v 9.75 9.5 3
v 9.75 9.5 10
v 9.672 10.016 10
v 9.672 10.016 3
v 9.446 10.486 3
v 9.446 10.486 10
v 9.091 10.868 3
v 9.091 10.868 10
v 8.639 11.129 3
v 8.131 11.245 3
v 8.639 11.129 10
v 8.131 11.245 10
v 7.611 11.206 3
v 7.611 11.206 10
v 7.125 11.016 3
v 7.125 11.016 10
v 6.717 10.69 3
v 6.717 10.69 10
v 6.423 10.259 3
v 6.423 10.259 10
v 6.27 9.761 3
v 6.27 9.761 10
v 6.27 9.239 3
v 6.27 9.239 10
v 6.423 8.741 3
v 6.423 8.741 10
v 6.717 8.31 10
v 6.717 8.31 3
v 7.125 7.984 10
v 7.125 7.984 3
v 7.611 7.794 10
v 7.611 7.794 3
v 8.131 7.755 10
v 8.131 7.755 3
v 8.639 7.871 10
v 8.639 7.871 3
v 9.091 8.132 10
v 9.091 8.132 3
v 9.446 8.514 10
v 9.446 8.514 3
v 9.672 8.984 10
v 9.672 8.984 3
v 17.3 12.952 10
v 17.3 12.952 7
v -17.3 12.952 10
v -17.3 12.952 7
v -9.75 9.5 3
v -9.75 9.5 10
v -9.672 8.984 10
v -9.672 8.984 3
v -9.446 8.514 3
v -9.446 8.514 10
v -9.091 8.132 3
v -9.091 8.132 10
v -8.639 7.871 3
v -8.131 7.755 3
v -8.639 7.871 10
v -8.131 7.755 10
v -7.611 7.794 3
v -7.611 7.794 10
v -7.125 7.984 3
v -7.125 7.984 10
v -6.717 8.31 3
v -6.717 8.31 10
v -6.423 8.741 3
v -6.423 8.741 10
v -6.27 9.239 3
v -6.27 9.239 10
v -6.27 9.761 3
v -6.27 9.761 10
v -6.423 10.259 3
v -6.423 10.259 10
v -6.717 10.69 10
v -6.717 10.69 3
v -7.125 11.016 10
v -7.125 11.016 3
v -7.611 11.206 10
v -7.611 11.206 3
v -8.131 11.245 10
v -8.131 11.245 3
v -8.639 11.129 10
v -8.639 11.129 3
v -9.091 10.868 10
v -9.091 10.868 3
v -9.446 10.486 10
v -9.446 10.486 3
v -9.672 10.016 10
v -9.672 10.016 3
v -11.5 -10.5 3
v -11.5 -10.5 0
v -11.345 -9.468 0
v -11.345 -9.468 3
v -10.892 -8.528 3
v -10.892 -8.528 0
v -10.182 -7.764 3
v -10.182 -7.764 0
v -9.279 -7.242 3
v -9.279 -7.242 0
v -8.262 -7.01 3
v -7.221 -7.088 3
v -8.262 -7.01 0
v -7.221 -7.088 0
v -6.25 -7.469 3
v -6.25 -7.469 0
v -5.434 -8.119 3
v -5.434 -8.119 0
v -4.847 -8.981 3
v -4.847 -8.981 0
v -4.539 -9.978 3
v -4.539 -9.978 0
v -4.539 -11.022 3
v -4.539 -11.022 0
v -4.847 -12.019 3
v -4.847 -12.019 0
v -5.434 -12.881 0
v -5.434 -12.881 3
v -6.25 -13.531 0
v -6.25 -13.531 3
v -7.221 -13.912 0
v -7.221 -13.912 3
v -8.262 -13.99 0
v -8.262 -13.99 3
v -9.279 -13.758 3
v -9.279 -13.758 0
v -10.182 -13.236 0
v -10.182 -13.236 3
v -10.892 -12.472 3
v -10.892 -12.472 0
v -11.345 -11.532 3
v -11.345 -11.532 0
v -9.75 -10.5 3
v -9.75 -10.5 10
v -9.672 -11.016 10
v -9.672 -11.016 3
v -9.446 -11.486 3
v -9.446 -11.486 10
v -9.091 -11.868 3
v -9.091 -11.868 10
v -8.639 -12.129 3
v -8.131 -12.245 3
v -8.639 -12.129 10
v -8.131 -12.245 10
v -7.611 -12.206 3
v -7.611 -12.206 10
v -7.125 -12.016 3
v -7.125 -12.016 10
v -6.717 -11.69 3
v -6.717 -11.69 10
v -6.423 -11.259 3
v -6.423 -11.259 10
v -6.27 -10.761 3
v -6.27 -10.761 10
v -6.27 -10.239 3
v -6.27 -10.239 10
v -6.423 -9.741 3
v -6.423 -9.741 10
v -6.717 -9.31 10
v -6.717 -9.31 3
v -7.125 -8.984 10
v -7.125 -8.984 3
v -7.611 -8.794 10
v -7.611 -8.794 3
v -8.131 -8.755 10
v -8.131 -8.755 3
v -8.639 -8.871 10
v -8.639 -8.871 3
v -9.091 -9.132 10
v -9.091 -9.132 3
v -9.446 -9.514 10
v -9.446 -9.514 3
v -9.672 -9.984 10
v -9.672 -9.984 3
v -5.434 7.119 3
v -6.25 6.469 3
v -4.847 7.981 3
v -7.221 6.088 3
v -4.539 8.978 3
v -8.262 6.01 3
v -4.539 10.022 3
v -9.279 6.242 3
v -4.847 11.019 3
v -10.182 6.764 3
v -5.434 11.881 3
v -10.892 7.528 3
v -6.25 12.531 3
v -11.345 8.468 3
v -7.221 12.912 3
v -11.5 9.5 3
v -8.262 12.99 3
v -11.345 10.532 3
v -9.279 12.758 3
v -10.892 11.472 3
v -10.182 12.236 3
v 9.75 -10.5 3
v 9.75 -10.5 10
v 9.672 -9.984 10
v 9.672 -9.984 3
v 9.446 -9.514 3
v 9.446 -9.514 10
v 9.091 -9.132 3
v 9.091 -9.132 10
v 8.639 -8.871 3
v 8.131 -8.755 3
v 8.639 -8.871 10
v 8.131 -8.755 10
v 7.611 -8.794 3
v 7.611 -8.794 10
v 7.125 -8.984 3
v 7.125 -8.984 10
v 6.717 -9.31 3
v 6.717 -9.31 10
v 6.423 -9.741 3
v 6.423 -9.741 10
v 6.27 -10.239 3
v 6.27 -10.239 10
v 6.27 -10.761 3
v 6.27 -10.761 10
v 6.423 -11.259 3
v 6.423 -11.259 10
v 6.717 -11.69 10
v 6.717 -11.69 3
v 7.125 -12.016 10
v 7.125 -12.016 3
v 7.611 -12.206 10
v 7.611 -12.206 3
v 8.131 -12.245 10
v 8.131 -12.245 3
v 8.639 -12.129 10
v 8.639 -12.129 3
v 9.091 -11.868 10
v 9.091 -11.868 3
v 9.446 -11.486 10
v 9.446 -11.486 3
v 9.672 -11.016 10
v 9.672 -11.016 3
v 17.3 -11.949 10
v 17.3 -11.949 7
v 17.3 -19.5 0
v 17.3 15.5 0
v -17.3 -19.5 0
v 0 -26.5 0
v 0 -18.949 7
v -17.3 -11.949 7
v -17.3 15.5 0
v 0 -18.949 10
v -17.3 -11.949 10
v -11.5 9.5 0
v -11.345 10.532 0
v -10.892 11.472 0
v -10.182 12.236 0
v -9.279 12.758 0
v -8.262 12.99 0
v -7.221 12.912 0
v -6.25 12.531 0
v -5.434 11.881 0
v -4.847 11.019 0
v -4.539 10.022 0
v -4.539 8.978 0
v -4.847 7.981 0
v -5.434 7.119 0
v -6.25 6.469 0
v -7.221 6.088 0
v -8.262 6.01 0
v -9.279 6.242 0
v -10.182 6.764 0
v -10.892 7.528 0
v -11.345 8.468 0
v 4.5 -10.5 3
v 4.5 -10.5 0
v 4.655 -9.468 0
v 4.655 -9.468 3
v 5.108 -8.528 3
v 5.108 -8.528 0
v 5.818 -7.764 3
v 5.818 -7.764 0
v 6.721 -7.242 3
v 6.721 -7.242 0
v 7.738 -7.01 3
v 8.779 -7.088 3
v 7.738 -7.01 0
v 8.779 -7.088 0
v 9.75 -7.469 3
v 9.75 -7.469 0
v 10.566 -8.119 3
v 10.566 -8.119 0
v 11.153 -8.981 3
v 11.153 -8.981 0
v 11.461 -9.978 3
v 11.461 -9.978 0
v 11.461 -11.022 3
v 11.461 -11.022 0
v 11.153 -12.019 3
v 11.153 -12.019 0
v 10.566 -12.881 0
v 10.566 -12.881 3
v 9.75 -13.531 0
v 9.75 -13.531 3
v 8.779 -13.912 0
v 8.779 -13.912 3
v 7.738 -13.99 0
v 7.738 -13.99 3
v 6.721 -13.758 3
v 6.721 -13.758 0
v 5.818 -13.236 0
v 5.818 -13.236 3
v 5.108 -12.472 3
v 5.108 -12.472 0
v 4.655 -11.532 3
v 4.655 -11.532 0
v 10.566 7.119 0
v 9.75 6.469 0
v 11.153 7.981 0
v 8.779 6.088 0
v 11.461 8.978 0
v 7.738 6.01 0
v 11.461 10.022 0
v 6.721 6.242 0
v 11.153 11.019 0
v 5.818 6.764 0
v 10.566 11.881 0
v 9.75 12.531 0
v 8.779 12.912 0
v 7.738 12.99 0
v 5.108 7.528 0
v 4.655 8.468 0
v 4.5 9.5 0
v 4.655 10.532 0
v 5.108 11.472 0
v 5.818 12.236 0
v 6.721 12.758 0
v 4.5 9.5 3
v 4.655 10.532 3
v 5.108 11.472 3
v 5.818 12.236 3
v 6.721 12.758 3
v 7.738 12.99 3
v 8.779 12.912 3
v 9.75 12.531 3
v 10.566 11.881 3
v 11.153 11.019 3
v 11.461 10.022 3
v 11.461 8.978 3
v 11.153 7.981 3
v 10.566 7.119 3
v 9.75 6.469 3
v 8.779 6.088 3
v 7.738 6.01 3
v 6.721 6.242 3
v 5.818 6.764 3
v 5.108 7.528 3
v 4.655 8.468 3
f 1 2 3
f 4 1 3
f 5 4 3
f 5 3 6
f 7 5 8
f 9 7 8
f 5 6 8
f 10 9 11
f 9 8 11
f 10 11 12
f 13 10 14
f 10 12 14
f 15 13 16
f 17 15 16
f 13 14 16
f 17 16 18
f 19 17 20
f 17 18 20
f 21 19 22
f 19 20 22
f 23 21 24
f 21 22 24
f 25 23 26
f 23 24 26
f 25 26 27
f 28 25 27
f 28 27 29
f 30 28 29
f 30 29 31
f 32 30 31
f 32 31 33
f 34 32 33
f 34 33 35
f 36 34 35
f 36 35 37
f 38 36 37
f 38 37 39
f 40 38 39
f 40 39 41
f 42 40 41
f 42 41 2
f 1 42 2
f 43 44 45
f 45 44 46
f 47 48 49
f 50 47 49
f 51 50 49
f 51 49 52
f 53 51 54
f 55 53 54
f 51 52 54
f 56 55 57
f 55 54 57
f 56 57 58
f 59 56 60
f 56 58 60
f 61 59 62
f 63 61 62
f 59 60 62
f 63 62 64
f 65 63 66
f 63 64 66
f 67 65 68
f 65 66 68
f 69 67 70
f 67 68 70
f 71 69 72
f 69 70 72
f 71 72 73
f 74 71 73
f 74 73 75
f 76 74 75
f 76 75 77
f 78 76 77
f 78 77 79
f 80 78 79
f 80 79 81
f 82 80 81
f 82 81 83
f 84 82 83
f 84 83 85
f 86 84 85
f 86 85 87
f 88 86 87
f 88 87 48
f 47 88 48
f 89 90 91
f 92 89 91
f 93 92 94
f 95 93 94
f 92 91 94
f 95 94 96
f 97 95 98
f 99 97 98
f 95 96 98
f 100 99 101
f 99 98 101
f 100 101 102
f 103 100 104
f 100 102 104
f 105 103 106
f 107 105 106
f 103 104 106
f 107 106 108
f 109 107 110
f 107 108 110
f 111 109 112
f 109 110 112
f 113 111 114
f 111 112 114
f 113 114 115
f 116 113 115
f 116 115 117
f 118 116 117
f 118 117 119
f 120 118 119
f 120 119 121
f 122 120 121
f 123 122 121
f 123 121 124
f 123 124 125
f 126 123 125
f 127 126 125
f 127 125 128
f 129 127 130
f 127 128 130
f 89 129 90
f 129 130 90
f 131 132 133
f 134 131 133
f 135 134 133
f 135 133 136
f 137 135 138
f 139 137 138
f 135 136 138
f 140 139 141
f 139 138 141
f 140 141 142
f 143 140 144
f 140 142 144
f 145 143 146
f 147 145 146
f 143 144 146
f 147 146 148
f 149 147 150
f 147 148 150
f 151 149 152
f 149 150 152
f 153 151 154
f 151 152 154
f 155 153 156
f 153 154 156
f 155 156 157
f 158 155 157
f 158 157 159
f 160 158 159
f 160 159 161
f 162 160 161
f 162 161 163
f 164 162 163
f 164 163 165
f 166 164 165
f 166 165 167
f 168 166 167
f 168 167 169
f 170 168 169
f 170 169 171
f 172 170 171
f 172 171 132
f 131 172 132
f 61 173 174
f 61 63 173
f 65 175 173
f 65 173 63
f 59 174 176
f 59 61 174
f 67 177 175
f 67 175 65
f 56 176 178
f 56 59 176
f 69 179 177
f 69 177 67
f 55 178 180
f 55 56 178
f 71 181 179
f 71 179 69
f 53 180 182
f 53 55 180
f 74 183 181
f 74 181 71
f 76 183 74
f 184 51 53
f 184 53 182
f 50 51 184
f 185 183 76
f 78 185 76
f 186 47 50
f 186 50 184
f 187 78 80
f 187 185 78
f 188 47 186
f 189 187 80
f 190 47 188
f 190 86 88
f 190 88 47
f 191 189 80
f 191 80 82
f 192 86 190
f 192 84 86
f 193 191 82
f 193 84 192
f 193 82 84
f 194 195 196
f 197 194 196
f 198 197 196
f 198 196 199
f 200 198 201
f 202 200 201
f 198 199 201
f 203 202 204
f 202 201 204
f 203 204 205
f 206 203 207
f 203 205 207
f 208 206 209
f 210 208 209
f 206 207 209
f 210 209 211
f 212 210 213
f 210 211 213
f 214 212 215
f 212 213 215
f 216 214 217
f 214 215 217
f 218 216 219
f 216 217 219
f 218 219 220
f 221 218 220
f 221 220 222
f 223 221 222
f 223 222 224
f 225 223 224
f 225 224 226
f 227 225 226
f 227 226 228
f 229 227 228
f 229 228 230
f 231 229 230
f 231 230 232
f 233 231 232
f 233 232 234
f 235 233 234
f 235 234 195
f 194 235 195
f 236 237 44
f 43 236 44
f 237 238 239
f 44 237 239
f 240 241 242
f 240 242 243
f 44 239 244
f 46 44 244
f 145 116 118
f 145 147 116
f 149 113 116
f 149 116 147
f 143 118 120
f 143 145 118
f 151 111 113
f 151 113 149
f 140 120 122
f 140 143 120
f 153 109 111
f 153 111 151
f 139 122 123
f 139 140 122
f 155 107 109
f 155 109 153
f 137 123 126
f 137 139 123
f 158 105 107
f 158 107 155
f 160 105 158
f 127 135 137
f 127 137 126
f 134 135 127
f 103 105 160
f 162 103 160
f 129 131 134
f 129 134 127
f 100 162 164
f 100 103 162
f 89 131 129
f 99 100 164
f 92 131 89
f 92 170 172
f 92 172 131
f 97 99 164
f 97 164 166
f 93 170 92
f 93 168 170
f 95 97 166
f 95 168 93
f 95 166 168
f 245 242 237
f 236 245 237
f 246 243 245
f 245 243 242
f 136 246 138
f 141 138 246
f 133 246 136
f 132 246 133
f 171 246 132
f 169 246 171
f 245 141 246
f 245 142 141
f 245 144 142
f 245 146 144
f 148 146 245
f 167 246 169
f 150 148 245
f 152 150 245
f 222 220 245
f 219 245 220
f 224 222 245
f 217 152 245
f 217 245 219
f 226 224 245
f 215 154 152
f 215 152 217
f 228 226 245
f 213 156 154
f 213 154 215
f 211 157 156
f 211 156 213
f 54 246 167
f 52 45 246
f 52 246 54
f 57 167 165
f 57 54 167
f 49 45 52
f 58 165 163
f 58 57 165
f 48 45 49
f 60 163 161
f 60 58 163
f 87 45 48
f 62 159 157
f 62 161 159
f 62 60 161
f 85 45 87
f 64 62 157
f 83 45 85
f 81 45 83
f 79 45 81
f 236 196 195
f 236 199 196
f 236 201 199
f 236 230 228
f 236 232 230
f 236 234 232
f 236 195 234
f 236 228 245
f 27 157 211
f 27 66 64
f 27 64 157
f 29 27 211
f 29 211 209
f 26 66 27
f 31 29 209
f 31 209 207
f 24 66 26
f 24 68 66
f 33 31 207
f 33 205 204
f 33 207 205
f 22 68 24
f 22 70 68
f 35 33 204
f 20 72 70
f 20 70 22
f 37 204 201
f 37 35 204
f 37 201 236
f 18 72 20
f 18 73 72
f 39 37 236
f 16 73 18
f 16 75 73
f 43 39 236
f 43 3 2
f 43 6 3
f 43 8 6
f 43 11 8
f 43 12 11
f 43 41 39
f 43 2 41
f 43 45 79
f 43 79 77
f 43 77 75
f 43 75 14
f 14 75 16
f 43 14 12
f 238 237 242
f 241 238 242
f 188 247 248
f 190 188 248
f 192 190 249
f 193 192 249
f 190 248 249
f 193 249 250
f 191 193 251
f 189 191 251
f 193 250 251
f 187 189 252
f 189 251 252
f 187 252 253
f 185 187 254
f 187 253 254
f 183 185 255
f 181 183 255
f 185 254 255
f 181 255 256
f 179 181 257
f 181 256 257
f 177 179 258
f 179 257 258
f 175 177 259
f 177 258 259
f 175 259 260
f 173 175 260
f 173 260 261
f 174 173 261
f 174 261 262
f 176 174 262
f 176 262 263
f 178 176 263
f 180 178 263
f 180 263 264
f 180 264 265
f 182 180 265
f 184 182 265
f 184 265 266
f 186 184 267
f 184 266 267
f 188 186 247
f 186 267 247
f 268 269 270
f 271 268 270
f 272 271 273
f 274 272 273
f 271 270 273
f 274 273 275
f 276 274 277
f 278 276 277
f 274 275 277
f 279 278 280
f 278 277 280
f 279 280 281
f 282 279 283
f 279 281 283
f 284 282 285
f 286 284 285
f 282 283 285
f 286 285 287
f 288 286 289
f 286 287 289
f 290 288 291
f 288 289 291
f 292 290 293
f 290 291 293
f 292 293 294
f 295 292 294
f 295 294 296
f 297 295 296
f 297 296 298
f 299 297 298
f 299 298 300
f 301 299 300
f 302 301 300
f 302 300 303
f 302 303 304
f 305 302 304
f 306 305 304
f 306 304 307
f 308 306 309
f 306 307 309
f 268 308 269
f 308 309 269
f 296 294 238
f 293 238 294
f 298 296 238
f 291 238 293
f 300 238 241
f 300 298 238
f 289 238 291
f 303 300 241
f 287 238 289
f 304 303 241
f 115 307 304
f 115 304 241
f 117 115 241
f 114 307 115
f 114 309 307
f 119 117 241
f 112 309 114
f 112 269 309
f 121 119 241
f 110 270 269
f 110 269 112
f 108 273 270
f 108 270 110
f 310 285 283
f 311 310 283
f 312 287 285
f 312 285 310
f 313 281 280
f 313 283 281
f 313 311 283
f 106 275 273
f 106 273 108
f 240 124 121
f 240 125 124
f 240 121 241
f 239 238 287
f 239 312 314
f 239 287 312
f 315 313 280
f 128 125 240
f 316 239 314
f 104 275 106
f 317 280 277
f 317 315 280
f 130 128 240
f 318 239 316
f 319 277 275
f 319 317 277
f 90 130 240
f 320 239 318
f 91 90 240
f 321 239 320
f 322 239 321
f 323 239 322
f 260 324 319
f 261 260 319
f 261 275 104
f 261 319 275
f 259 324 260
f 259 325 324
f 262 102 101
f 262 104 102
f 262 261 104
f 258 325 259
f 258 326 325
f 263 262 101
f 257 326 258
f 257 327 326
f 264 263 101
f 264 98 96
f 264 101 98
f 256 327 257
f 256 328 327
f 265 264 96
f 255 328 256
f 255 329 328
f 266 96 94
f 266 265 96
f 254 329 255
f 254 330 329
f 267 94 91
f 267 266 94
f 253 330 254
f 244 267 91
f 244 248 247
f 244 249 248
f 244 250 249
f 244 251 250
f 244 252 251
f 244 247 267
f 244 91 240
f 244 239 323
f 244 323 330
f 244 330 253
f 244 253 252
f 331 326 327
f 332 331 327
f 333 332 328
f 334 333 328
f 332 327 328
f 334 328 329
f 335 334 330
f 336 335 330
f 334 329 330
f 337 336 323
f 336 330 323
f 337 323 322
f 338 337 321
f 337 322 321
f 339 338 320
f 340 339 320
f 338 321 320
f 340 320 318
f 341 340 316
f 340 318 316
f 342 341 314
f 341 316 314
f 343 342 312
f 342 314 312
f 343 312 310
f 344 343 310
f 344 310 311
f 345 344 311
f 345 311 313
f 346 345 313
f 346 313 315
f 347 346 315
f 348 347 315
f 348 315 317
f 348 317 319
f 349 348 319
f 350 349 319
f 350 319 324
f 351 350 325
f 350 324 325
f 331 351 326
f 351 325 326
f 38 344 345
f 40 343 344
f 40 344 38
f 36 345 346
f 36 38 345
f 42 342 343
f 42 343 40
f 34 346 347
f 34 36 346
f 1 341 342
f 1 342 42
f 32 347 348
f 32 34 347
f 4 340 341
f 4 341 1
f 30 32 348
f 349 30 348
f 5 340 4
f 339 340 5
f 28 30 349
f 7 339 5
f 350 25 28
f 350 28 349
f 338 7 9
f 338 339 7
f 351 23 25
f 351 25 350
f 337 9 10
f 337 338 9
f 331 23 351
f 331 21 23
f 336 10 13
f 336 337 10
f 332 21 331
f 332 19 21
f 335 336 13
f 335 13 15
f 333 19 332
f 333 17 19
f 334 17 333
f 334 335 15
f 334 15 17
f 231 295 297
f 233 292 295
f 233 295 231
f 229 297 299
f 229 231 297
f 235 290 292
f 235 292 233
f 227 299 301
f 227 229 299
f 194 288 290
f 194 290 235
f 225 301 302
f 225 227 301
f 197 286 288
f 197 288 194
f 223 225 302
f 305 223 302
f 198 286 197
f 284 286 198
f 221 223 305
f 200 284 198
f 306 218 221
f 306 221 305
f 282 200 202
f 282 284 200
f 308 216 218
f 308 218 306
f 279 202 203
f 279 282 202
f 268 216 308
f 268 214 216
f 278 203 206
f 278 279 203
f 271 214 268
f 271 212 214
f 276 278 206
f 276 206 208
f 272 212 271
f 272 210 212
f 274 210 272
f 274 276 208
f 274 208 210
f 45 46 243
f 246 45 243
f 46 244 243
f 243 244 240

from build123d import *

# Parameters (mm, degrees)
ESBO_O1_W                = 34.6
ESBO_O1_H                = 26
RESSALTO_EXTRUS_O1_DEPTH = 7
ESBO_O10_W               = 34.6
ESBO_O10_H               = 2.5
RESSALTO_EXTRUS_O4_DEPTH = 7
CHANFRO1_SIZE            = 7
CHANFRO2_SIZE2           = 7
CHANFRO2_SIZE            = 2.54779164
RESSALTO_EXTRUS_O5_DEPTH = 3
ESBO_O11_R               = 1.75
CORTE_EXTRUS_O1_DEPTH    = 10
ESBO_O12_R               = 3.5
CORTE_EXTRUS_O2_DEPTH    = 3


with BuildPart() as part:
    # Esboço1 → Ressalto-extrusão1 (new body)
    with BuildSketch(Plane.XY):
        Rectangle(ESBO_O1_W, ESBO_O1_H)
    extrude(amount=RESSALTO_EXTRUS_O1_DEPTH)

    # Esboço10 → Ressalto-extrusão4 (add)
    with BuildSketch(Plane(origin=(0, 0, 0), x_dir=(-1, 0, 0), z_dir=(0, 0, -1))):
        Polygon((-17.3, -19.5), (0, -26.5), (17.3, -19.5), (17.3, -13), (-17.3, -13), align=None)
        with Locations((0, 14.25)):
            Rectangle(ESBO_O10_W, ESBO_O10_H)
    extrude(amount=-RESSALTO_EXTRUS_O4_DEPTH)

    # Chanfro1
    chanfro1_edges = [part.edges().sort_by_distance(p)[0] for p in [
        (8.65, -23, 7),
        (-8.65, -23, 7),
    ]]
    chamfer(chanfro1_edges, length=CHANFRO1_SIZE - 0.0001)  # a hair under: the kernel refuses the full size

    # Chanfro2
    chanfro2_edges = [part.edges().sort_by_distance(p)[0] for p in [
        (0, 15.5, 7),
    ]]
    chanfro2_side = [part.faces().sort_by_distance(p)[0] for p in [
        (0, 15.449044167, 7),
    ]]
    chamfer(chanfro2_edges, length=CHANFRO2_SIZE - 0.0001, length2=CHANFRO2_SIZE2 - 0.0001, reference=chanfro2_side[0])  # a hair under: the kernel refuses the full size

    # Esboço13 → Ressalto-extrusão5 (add)
    with BuildSketch(Plane.XY.offset(7)):
        Polygon((17.3, -11.948687565), (17.3, 12.95220836), (-17.3, 12.95220836), (-17.3, -11.948687565), (0, -18.948687565), align=None)
    extrude(amount=RESSALTO_EXTRUS_O5_DEPTH)

    # Esboço11 → Corte-extrusão1 (cut)
    with BuildSketch(Plane.XY.offset(10)):
        with Locations((8, 9.5)):
            Circle(ESBO_O11_R)
        with Locations((8, -10.5)):
            Circle(ESBO_O11_R)
        with Locations(Location((-8, -10.5, 0), (0, 0, 180))):
            Circle(ESBO_O11_R)
        with Locations(Location((-8, 9.5, 0), (0, 0, 180))):
            Circle(ESBO_O11_R)
    extrude(amount=-CORTE_EXTRUS_O1_DEPTH, mode=Mode.SUBTRACT)

    # Esboço12 → Corte-extrusão2 (cut)
    with BuildSketch(Plane(origin=(0, 0, 0), x_dir=(-1, 0, 0), z_dir=(0, 0, -1))):
        with Locations((-8, 9.5)):
            Circle(ESBO_O12_R)
        with Locations((8, 9.5)):
            Circle(ESBO_O12_R)
        with Locations((-8, -10.5)):
            Circle(ESBO_O12_R)
        with Locations((8, -10.5)):
            Circle(ESBO_O12_R)
    extrude(amount=-CORTE_EXTRUS_O2_DEPTH, mode=Mode.SUBTRACT)


solid = part.part
